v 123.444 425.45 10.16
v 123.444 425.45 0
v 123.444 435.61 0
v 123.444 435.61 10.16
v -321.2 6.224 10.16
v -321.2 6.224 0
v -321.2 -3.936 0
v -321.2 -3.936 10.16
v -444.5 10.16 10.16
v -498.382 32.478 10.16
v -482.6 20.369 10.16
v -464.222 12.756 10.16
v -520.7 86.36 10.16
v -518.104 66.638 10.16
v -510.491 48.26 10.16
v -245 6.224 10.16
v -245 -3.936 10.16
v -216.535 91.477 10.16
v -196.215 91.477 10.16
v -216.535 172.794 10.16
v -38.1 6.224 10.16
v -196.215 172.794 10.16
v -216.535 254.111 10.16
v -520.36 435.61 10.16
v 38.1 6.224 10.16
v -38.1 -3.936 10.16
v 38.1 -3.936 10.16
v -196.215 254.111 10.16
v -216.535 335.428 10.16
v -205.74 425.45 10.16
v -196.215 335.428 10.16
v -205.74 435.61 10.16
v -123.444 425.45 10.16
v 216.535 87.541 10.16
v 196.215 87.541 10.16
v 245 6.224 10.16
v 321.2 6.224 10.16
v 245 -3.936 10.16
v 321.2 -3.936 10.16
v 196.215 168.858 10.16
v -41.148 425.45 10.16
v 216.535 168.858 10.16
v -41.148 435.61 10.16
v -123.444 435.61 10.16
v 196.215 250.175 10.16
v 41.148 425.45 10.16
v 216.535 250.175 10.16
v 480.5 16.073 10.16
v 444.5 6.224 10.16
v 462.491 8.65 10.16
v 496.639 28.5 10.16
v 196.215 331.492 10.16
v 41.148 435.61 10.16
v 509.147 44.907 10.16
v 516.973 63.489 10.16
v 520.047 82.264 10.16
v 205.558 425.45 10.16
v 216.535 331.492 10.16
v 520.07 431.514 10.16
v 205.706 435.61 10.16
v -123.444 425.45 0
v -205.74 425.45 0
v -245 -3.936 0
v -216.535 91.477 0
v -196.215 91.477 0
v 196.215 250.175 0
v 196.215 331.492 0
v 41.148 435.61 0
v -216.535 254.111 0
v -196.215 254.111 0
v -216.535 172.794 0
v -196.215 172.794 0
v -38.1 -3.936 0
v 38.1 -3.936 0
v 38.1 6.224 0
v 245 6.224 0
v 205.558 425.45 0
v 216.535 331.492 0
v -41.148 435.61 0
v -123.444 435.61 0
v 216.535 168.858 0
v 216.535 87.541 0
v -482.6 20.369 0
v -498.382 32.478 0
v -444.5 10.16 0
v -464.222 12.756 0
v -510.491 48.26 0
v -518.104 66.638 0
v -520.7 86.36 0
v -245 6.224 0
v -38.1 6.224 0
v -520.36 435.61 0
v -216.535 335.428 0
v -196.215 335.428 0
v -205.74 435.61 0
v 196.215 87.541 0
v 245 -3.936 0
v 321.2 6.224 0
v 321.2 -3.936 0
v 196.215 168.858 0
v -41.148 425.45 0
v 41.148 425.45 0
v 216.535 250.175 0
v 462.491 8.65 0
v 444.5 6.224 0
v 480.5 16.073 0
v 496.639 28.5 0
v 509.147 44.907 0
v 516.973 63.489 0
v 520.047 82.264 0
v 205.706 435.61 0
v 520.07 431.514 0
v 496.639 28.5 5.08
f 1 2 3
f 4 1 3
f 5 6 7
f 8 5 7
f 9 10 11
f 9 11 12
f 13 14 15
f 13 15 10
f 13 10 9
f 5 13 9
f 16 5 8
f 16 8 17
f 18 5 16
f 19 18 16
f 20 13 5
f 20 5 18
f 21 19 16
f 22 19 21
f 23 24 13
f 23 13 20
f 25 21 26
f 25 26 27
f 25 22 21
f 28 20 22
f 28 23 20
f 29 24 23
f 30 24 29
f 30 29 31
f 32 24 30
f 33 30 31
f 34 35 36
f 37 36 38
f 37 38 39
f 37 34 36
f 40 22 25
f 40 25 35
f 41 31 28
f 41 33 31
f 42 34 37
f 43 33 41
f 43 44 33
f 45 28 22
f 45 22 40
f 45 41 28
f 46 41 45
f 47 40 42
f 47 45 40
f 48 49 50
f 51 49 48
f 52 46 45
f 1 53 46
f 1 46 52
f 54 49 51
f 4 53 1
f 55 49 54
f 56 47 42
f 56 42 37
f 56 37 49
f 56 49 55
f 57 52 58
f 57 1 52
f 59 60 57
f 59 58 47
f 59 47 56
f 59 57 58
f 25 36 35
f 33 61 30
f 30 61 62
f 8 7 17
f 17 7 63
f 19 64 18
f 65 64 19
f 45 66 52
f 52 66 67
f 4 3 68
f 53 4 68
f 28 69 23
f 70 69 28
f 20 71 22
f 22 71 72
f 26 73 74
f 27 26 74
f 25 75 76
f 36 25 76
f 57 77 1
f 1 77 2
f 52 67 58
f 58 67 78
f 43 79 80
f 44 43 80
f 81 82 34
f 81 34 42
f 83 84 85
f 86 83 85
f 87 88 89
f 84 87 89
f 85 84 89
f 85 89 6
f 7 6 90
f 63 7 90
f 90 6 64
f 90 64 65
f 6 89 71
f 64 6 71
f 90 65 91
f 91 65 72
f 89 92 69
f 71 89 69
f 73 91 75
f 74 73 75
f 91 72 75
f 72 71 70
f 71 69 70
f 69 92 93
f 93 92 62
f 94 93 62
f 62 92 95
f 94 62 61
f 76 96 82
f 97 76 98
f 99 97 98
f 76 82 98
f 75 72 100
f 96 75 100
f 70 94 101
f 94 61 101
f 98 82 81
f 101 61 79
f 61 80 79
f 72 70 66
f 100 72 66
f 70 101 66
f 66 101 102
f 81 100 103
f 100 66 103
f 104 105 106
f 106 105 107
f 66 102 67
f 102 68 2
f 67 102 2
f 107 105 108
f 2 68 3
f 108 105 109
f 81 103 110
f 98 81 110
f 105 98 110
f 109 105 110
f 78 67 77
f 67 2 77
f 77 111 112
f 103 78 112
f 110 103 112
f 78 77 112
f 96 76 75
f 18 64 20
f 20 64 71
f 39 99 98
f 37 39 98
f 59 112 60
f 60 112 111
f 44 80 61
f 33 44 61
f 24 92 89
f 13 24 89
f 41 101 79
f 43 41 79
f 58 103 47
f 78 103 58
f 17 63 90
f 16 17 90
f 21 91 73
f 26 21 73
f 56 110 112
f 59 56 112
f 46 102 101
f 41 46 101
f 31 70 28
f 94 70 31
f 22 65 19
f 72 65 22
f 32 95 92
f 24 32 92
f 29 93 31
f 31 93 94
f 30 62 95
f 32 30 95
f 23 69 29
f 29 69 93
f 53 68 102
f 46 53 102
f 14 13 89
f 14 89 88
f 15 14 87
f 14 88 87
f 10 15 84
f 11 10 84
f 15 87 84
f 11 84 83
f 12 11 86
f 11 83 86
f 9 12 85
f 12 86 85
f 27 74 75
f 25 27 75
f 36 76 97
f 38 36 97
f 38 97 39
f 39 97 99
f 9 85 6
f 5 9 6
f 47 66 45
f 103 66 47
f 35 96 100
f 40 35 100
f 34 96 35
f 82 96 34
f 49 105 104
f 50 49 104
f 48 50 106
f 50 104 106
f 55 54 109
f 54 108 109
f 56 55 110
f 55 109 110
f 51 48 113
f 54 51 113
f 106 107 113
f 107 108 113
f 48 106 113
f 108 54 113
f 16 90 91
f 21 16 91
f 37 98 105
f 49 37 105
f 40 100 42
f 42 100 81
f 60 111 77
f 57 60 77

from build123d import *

# Parameters (mm, degrees)
SKETCH1_W           = 20.32
SKETCH1_H           = 81.316938585
SKETCH1_H_2         = 81.316938584
BOSS_EXTRUDE1_DEPTH = 10.16


with BuildPart() as part:
    # Sketch1 → Boss-Extrude1 (new body)
    # profile 1 of 2: a face of its own
    with BuildSketch(Plane.XY):
        with BuildLine():
            ThreePointArc((-520.699999986, 86.36), (-498.381536717, 32.478463279), (-444.5, 10.16))
            Line((-444.5, 10.16), (-321.2, 6.224098454))
            Line((-321.2, 6.224098454), (-321.2, -3.935901546))
            Line((-321.2, -3.935901546), (-245, -3.935901546))
            Line((-245, -3.935901546), (-245, 6.224098454))
            Line((-245, 6.224098454), (-38.1, 6.224098454))
            Line((-38.1, 6.224098454), (-38.1, -3.935901546))
            Line((-38.1, -3.935901546), (38.1, -3.935901546))
            Line((38.1, -3.935901546), (38.1, 6.224098454))
            Line((38.1, 6.224098454), (245, 6.224098454))
            Line((245, 6.224098454), (245, -3.935901546))
            Line((245, -3.935901546), (321.2, -3.935901546))
            Line((321.2, -3.935901546), (321.2, 6.224098454))
            Line((321.2, 6.224098454), (444.500003861, 6.224098454))
            add(Edge.make_bspline(
                [(444.500003861, 6.224098454), (516.375223264, 6.870661069), (520.046520409, 82.264098454)],
                knots=[3.150157412, 3.150157412, 3.150157412, 4.661289858, 4.661289858, 4.661289858], degree=2, weights=[1, 0.7278834, 1]))
            Line((520.046520409, 82.264098454), (520.070316171, 431.514078957))
            Line((520.070316171, 431.514078957), (205.706405146, 435.61))
            Line((205.706405146, 435.61), (205.558012439, 425.45))
            Line((205.558012439, 425.45), (123.444, 425.45))
            Line((123.444, 425.45), (123.444, 435.61))
            Line((123.444, 435.61), (41.148, 435.61))
            Line((41.148, 435.61), (41.148, 425.45))
            Line((41.148, 425.45), (-41.148, 425.45))
            Line((-41.148, 425.45), (-41.148, 435.61))
            Line((-41.148, 435.61), (-123.444, 435.61))
            Line((-123.444, 435.61), (-123.444, 425.45))
            Line((-123.444, 425.45), (-205.739999986, 425.45))
            Line((-205.739999986, 425.45), (-205.739999986, 388.35))
            Line((-205.739999986, 388.35), (-230.359692704, 388.35))
            Line((-230.359692704, 388.35), (-230.359692704, 435.61))
            Line((-230.359692704, 435.61), (-520.3601107, 435.61))
            Line((-520.3601107, 435.61), (-520.699999986, 86.36))
        make_face()
        with Locations((-206.375268781, 132.135407878)):
            Rectangle(SKETCH1_W, SKETCH1_H, mode=Mode.SUBTRACT)
        with Locations((206.375268781, 128.199506331)):
            Rectangle(SKETCH1_W, SKETCH1_H_2, mode=Mode.SUBTRACT)
        with Locations((-206.375268781, 294.769285048)):
            Rectangle(SKETCH1_W, SKETCH1_H, mode=Mode.SUBTRACT)
        with Locations((206.375268781, 290.833383501)):
            Rectangle(SKETCH1_W, SKETCH1_H, mode=Mode.SUBTRACT)
    # profile 2 of 2: a face of its own
    with BuildSketch(Plane.XY):
        Polygon((-205.739999986, 435.61), (-230.359692704, 435.61), (-230.359692704, 388.35), (-205.739999986, 388.35), (-205.739999986, 425.45), align=None)
    extrude(amount=BOSS_EXTRUDE1_DEPTH)


solid = part.part
